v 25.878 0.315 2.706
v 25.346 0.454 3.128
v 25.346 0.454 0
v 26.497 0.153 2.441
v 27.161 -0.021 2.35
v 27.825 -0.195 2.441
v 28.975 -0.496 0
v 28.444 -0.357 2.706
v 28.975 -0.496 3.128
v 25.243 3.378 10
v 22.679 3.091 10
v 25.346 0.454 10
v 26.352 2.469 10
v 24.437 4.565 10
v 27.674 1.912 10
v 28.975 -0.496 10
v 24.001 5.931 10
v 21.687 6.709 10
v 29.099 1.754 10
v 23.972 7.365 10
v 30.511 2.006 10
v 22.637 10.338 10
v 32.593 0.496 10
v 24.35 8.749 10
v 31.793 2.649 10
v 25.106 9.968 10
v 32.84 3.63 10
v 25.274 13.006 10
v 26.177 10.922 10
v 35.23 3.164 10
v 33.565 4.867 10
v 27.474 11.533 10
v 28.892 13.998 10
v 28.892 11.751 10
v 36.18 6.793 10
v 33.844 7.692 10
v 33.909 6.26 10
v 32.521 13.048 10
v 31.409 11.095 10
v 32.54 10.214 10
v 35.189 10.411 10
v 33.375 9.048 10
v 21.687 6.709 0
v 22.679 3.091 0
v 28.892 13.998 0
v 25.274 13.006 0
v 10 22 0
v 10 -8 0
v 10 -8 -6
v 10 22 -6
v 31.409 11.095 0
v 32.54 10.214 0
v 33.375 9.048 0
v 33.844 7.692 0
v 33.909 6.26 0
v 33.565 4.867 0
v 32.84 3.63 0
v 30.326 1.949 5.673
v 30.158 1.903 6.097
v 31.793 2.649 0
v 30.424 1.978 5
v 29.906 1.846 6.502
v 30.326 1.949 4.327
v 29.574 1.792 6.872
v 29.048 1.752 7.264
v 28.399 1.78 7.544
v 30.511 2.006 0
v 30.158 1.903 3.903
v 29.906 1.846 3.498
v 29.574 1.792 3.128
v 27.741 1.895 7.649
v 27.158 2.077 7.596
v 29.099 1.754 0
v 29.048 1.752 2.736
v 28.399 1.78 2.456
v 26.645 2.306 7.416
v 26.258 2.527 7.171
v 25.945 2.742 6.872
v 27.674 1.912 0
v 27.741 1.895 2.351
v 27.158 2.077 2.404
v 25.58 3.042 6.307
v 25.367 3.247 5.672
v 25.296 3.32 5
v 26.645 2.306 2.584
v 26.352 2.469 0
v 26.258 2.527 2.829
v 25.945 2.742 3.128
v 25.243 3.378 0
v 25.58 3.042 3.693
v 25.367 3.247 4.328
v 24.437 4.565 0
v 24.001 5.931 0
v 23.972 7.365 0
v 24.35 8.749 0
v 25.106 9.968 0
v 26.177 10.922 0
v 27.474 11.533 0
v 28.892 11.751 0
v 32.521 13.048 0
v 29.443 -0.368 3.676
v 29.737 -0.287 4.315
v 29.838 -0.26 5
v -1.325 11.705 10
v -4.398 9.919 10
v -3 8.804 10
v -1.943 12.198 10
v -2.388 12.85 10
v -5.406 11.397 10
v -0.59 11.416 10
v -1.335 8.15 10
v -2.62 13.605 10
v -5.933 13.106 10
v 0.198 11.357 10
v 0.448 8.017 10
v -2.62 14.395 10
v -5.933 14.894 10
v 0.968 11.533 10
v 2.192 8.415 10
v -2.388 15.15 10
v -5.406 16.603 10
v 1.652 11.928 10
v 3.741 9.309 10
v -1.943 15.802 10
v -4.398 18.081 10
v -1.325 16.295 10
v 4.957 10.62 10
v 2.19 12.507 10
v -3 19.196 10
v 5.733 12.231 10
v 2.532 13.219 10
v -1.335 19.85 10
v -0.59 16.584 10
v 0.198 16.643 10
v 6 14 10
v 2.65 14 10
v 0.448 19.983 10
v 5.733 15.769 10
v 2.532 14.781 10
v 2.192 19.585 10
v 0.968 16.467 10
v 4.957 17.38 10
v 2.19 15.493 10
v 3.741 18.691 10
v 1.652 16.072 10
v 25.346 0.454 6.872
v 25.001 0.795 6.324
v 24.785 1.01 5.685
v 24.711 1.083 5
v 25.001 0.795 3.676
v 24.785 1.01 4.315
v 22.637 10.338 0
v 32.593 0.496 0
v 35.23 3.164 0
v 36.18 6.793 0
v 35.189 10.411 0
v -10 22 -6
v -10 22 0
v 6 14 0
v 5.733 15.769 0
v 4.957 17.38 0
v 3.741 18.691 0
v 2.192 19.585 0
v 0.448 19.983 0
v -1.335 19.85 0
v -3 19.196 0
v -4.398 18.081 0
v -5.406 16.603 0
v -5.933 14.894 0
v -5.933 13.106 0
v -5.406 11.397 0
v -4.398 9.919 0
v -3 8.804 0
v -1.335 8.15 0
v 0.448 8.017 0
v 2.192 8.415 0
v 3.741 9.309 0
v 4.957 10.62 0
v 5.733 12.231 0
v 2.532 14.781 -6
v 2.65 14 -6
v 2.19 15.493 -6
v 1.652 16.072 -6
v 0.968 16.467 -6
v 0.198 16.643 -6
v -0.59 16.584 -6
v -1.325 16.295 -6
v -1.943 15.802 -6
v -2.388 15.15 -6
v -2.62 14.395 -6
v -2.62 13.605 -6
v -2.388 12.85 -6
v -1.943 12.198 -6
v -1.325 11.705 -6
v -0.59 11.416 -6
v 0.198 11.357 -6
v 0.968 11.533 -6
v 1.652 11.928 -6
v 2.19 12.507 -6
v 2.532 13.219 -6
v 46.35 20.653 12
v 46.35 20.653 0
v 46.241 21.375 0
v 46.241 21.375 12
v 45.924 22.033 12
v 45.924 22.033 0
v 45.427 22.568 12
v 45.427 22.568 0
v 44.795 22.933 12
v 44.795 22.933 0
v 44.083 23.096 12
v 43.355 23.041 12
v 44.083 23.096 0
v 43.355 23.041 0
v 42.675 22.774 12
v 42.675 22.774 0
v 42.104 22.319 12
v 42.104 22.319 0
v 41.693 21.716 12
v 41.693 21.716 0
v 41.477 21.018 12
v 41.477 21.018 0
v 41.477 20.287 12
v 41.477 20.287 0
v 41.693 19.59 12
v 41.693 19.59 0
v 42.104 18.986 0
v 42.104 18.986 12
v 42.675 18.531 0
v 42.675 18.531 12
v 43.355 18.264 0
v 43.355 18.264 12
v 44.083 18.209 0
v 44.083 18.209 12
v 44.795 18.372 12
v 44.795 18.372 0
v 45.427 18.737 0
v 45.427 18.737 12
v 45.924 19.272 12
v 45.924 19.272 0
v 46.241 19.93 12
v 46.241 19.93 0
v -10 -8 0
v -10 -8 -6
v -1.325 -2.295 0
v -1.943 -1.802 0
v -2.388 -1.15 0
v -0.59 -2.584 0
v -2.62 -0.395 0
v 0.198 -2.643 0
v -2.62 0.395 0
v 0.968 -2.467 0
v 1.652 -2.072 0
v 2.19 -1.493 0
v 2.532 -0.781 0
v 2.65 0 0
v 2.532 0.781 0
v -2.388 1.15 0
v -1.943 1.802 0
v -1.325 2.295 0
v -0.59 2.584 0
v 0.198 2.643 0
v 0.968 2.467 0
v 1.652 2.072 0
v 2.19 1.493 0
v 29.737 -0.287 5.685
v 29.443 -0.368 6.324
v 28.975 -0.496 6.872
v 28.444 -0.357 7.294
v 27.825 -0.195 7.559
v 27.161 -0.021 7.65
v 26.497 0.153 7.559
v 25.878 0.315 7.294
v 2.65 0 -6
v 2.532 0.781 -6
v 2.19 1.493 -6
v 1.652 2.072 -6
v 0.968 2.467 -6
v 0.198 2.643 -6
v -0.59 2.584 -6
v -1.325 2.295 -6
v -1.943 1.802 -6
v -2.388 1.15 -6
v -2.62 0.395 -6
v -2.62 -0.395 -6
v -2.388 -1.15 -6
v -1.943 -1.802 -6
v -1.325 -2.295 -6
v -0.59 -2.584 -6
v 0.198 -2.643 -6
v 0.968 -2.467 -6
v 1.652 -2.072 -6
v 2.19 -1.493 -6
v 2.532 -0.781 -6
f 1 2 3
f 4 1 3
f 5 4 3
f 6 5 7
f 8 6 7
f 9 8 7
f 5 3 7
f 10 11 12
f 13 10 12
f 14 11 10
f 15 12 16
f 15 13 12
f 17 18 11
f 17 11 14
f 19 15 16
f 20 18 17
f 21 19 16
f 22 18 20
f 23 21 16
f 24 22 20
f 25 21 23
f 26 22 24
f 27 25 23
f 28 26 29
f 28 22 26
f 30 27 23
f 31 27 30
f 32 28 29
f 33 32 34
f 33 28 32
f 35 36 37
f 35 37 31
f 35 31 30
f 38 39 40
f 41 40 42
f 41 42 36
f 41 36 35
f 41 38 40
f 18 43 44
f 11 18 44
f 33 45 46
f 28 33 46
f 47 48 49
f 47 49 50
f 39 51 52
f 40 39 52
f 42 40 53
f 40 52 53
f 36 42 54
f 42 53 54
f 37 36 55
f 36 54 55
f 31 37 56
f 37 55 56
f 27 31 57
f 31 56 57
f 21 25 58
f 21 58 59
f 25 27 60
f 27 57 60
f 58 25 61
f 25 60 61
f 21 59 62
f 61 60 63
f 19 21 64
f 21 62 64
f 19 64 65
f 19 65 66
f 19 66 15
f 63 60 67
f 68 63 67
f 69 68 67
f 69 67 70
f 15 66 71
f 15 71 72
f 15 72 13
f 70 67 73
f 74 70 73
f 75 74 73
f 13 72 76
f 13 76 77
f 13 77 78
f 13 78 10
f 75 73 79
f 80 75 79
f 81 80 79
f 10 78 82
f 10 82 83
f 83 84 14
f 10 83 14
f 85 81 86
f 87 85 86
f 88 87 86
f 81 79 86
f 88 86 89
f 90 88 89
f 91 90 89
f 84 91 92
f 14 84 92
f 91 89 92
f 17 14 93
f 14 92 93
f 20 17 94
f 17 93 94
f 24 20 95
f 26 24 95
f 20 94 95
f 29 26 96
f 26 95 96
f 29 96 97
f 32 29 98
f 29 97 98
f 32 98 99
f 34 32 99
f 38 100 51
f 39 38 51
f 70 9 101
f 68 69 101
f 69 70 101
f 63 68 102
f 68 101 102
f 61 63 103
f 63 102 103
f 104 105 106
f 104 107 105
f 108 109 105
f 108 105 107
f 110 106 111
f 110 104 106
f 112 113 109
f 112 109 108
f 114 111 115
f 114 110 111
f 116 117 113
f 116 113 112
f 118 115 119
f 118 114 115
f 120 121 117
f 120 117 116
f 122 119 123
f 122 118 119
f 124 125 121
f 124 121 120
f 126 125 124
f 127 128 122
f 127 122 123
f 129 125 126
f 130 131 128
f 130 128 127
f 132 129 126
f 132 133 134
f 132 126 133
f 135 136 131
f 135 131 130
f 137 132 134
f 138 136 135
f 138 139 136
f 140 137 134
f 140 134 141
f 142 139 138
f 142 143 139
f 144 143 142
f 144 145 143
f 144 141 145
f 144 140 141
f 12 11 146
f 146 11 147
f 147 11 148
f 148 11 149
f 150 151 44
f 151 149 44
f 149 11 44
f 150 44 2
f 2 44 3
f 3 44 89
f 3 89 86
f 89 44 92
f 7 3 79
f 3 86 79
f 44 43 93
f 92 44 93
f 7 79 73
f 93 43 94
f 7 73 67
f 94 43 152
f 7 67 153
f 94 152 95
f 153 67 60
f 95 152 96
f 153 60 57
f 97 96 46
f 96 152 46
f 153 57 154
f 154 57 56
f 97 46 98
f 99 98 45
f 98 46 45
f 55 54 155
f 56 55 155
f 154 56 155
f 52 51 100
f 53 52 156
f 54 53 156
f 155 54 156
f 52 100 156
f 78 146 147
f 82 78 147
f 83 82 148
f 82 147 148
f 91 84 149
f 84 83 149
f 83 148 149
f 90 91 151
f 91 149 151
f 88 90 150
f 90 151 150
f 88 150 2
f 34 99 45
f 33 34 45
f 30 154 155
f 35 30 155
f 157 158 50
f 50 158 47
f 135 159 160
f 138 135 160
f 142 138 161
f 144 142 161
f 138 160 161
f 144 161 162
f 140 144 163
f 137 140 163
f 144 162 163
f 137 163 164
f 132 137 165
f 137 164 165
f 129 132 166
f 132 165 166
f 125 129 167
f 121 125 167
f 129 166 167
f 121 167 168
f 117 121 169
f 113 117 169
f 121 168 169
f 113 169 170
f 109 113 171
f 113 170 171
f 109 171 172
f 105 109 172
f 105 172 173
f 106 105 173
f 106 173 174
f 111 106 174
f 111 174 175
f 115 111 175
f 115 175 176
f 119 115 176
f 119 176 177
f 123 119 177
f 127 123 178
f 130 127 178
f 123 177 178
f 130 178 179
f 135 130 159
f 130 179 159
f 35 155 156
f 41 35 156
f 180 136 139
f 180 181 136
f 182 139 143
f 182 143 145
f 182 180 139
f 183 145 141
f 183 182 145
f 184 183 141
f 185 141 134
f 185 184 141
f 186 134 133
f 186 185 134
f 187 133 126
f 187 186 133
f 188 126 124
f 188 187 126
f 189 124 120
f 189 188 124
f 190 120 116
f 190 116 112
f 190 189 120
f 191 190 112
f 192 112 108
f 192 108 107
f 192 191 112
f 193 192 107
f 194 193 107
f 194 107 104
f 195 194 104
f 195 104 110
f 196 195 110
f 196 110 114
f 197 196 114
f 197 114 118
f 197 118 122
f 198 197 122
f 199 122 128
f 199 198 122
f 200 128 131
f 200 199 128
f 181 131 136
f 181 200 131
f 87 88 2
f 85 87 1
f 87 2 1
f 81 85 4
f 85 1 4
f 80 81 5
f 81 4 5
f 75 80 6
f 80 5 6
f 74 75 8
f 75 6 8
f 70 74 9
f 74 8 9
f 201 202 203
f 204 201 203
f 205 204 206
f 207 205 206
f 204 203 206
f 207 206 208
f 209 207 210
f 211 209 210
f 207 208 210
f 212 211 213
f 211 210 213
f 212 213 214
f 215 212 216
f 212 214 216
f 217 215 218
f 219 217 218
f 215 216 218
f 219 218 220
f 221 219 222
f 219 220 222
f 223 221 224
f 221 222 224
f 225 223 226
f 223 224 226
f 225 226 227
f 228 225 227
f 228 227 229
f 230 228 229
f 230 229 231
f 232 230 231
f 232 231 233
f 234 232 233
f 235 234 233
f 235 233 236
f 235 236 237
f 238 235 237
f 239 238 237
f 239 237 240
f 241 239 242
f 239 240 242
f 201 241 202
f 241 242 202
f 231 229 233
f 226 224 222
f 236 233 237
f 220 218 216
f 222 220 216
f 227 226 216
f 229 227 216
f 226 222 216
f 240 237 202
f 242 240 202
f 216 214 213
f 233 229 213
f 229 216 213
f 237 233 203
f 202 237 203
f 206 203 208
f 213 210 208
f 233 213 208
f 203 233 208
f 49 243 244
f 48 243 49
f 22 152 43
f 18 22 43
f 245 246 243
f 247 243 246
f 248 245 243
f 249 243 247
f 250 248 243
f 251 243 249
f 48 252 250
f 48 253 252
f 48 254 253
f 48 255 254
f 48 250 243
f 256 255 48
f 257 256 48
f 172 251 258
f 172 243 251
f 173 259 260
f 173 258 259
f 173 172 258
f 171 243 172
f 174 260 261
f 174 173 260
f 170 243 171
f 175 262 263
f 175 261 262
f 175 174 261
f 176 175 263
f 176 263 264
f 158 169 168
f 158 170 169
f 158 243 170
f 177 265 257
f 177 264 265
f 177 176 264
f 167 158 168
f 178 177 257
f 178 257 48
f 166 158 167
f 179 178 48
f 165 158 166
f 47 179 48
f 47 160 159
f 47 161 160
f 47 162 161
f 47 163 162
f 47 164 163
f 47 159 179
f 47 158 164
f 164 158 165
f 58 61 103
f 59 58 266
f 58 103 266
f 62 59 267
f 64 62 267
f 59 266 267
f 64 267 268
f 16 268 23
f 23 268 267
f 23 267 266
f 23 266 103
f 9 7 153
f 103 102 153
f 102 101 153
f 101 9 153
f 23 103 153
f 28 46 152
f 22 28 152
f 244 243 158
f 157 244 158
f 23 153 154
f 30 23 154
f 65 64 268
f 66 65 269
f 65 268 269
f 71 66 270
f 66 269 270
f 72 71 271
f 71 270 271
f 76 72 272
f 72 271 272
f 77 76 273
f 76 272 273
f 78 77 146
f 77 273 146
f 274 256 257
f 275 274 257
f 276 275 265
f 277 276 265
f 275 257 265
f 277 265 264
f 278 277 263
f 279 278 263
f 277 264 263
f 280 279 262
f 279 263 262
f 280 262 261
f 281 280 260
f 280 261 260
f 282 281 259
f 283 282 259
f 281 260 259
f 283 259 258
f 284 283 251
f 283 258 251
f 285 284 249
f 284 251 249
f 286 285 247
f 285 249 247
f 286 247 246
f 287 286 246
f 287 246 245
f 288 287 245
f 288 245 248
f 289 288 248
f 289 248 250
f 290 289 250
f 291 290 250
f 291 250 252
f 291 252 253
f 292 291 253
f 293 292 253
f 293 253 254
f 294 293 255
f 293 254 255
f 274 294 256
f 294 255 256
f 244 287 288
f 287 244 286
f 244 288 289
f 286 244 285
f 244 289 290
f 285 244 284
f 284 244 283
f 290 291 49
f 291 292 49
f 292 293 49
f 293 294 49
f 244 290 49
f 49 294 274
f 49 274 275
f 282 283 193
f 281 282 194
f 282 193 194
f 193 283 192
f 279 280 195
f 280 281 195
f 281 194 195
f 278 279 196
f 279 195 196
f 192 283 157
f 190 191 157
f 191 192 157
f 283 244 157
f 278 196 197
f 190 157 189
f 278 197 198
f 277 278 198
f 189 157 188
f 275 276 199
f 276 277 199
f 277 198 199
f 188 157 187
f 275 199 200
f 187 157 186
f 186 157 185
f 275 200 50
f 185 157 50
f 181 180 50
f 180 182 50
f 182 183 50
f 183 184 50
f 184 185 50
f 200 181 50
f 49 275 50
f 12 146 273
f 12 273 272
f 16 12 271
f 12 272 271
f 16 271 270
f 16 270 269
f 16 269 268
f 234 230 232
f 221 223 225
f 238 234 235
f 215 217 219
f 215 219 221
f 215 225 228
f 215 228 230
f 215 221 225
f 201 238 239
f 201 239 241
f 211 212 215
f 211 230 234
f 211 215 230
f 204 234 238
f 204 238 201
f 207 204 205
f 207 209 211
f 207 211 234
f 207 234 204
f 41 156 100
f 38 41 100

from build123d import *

# Parameters (mm, degrees)
F0_W     = 20
F0_H     = 30
F0_R     = 2.65
F0_R_2   = 6
F1_DEPTH = 6
F2_DEPTH = 10
F3_DEPTH = 10
F5_DEPTH = 2.7610118925
F0_R_3   = 2.45
F6_DEPTH = 12


# Not quite as in the source:
# - a feature names something its author has since deleted; it is built from what else it names


with BuildPart() as f1:
    # F0 (on Top) → F1 (new body)
    with BuildSketch(Plane.XY):
        with Locations((0, 7)):
            Rectangle(F0_W, F0_H)
        Circle(F0_R, mode=Mode.SUBTRACT)
        with Locations((0, 14)):
            Circle(F0_R_2, mode=Mode.SUBTRACT)
        with Locations((0, 14)):
            Circle(F0_R_2)
        with Locations((0, 14)):
            Circle(F0_R, mode=Mode.SUBTRACT)
    extrude(amount=-F1_DEPTH)

    # F0 (on Top) → F2 (join)
    with BuildSketch(Plane.XY):
        with Locations((0, 14)):
            Circle(F0_R_2)
        with Locations((0, 14)):
            Circle(F0_R, mode=Mode.SUBTRACT)
    extrude(amount=F2_DEPTH)


with BuildPart() as f3:
    # F0 (on Top) → F3 (new body)
    with BuildSketch(Plane.XY):
        with BuildLine():
            ThreePointArc((31.4085708903, 11.0953978322), (27.6737183454, 1.912242965), (28.8917668759, 11.750729364))
            Line((28.8917668759, 11.750729364), (28.8917668759, 13.9977169424))
            Line((28.8917668759, 13.9977169424), (25.2739680355, 13.0059012255))
            Line((25.2739680355, 13.0059012255), (22.6367701923, 10.3380641986))
            Line((22.6367701923, 10.3380641986), (21.6868083789, 6.7090506386))
            Line((21.6868083789, 6.7090506386), (22.6786240958, 3.0912517981))
            Line((22.6786240958, 3.0912517981), (25.3464611227, 0.454053955))
            Line((25.3464611227, 0.454053955), (28.9754746827, -0.4959078585))
            Line((28.9754746827, -0.4959078585), (32.5932735232, 0.4959078585))
            Line((32.5932735232, 0.4959078585), (35.2304713663, 3.1637448854))
            Line((35.2304713663, 3.1637448854), (36.1804331798, 6.7927584454))
            Line((36.1804331798, 6.7927584454), (35.1886174628, 10.4105572858))
            Line((35.1886174628, 10.4105572858), (32.5207804359, 13.047755129))
            Line((32.5207804359, 13.047755129), (31.4085708903, 11.0953978322))
        make_face()
    extrude(amount=F3_DEPTH)

    # F4 (on face) → F5 (cut, through all)
    with BuildSketch(Plane(origin=(1.7366663624, 6.63435697, 0), x_dir=(0.9674044991, -0.2532361252, 0), z_dir=(-0.2532361252, -0.9674044991, 0))):
        with BuildLine():
            Line((28.1565863562, 6.8720198406), (28.1565863562, 3.1279801594))
            ThreePointArc((28.1565863562, 3.1279801594), (28.7297128763, 3.9870729344), (28.9309420092, 5))
            ThreePointArc((28.9309420092, 5), (28.7297128763, 6.0129270656), (28.1565863562, 6.8720198406))
        make_face()
        with BuildLine():
            Line((24.4052976622, 6.8720198406), (24.4052976622, 3.1279801594))
            ThreePointArc((24.4052976622, 3.1279801594), (26.2809420092, 2.35), (28.1565863562, 3.1279801594))
            Line((28.1565863562, 3.1279801594), (28.1565863562, 6.8720198406))
            ThreePointArc((28.1565863562, 6.8720198406), (26.2809420092, 7.65), (24.4052976622, 6.8720198406))
        make_face()
        with BuildLine():
            ThreePointArc((24.4052976622, 6.8720198406), (23.6309420092, 5), (24.4052976622, 3.1279801594))
            Line((24.4052976622, 3.1279801594), (24.4052976622, 6.8720198406))
        make_face()
    extrude(amount=-F5_DEPTH, mode=Mode.SUBTRACT)


with BuildPart() as f6:
    # F0 (on Top) → F6 (new body)
    with BuildSketch(Plane.XY):
        with Locations((43.8999424085, 20.652592666)):
            Circle(F0_R_3)
    extrude(amount=F6_DEPTH)


solid = Compound([f1.part, f3.part, f6.part])
